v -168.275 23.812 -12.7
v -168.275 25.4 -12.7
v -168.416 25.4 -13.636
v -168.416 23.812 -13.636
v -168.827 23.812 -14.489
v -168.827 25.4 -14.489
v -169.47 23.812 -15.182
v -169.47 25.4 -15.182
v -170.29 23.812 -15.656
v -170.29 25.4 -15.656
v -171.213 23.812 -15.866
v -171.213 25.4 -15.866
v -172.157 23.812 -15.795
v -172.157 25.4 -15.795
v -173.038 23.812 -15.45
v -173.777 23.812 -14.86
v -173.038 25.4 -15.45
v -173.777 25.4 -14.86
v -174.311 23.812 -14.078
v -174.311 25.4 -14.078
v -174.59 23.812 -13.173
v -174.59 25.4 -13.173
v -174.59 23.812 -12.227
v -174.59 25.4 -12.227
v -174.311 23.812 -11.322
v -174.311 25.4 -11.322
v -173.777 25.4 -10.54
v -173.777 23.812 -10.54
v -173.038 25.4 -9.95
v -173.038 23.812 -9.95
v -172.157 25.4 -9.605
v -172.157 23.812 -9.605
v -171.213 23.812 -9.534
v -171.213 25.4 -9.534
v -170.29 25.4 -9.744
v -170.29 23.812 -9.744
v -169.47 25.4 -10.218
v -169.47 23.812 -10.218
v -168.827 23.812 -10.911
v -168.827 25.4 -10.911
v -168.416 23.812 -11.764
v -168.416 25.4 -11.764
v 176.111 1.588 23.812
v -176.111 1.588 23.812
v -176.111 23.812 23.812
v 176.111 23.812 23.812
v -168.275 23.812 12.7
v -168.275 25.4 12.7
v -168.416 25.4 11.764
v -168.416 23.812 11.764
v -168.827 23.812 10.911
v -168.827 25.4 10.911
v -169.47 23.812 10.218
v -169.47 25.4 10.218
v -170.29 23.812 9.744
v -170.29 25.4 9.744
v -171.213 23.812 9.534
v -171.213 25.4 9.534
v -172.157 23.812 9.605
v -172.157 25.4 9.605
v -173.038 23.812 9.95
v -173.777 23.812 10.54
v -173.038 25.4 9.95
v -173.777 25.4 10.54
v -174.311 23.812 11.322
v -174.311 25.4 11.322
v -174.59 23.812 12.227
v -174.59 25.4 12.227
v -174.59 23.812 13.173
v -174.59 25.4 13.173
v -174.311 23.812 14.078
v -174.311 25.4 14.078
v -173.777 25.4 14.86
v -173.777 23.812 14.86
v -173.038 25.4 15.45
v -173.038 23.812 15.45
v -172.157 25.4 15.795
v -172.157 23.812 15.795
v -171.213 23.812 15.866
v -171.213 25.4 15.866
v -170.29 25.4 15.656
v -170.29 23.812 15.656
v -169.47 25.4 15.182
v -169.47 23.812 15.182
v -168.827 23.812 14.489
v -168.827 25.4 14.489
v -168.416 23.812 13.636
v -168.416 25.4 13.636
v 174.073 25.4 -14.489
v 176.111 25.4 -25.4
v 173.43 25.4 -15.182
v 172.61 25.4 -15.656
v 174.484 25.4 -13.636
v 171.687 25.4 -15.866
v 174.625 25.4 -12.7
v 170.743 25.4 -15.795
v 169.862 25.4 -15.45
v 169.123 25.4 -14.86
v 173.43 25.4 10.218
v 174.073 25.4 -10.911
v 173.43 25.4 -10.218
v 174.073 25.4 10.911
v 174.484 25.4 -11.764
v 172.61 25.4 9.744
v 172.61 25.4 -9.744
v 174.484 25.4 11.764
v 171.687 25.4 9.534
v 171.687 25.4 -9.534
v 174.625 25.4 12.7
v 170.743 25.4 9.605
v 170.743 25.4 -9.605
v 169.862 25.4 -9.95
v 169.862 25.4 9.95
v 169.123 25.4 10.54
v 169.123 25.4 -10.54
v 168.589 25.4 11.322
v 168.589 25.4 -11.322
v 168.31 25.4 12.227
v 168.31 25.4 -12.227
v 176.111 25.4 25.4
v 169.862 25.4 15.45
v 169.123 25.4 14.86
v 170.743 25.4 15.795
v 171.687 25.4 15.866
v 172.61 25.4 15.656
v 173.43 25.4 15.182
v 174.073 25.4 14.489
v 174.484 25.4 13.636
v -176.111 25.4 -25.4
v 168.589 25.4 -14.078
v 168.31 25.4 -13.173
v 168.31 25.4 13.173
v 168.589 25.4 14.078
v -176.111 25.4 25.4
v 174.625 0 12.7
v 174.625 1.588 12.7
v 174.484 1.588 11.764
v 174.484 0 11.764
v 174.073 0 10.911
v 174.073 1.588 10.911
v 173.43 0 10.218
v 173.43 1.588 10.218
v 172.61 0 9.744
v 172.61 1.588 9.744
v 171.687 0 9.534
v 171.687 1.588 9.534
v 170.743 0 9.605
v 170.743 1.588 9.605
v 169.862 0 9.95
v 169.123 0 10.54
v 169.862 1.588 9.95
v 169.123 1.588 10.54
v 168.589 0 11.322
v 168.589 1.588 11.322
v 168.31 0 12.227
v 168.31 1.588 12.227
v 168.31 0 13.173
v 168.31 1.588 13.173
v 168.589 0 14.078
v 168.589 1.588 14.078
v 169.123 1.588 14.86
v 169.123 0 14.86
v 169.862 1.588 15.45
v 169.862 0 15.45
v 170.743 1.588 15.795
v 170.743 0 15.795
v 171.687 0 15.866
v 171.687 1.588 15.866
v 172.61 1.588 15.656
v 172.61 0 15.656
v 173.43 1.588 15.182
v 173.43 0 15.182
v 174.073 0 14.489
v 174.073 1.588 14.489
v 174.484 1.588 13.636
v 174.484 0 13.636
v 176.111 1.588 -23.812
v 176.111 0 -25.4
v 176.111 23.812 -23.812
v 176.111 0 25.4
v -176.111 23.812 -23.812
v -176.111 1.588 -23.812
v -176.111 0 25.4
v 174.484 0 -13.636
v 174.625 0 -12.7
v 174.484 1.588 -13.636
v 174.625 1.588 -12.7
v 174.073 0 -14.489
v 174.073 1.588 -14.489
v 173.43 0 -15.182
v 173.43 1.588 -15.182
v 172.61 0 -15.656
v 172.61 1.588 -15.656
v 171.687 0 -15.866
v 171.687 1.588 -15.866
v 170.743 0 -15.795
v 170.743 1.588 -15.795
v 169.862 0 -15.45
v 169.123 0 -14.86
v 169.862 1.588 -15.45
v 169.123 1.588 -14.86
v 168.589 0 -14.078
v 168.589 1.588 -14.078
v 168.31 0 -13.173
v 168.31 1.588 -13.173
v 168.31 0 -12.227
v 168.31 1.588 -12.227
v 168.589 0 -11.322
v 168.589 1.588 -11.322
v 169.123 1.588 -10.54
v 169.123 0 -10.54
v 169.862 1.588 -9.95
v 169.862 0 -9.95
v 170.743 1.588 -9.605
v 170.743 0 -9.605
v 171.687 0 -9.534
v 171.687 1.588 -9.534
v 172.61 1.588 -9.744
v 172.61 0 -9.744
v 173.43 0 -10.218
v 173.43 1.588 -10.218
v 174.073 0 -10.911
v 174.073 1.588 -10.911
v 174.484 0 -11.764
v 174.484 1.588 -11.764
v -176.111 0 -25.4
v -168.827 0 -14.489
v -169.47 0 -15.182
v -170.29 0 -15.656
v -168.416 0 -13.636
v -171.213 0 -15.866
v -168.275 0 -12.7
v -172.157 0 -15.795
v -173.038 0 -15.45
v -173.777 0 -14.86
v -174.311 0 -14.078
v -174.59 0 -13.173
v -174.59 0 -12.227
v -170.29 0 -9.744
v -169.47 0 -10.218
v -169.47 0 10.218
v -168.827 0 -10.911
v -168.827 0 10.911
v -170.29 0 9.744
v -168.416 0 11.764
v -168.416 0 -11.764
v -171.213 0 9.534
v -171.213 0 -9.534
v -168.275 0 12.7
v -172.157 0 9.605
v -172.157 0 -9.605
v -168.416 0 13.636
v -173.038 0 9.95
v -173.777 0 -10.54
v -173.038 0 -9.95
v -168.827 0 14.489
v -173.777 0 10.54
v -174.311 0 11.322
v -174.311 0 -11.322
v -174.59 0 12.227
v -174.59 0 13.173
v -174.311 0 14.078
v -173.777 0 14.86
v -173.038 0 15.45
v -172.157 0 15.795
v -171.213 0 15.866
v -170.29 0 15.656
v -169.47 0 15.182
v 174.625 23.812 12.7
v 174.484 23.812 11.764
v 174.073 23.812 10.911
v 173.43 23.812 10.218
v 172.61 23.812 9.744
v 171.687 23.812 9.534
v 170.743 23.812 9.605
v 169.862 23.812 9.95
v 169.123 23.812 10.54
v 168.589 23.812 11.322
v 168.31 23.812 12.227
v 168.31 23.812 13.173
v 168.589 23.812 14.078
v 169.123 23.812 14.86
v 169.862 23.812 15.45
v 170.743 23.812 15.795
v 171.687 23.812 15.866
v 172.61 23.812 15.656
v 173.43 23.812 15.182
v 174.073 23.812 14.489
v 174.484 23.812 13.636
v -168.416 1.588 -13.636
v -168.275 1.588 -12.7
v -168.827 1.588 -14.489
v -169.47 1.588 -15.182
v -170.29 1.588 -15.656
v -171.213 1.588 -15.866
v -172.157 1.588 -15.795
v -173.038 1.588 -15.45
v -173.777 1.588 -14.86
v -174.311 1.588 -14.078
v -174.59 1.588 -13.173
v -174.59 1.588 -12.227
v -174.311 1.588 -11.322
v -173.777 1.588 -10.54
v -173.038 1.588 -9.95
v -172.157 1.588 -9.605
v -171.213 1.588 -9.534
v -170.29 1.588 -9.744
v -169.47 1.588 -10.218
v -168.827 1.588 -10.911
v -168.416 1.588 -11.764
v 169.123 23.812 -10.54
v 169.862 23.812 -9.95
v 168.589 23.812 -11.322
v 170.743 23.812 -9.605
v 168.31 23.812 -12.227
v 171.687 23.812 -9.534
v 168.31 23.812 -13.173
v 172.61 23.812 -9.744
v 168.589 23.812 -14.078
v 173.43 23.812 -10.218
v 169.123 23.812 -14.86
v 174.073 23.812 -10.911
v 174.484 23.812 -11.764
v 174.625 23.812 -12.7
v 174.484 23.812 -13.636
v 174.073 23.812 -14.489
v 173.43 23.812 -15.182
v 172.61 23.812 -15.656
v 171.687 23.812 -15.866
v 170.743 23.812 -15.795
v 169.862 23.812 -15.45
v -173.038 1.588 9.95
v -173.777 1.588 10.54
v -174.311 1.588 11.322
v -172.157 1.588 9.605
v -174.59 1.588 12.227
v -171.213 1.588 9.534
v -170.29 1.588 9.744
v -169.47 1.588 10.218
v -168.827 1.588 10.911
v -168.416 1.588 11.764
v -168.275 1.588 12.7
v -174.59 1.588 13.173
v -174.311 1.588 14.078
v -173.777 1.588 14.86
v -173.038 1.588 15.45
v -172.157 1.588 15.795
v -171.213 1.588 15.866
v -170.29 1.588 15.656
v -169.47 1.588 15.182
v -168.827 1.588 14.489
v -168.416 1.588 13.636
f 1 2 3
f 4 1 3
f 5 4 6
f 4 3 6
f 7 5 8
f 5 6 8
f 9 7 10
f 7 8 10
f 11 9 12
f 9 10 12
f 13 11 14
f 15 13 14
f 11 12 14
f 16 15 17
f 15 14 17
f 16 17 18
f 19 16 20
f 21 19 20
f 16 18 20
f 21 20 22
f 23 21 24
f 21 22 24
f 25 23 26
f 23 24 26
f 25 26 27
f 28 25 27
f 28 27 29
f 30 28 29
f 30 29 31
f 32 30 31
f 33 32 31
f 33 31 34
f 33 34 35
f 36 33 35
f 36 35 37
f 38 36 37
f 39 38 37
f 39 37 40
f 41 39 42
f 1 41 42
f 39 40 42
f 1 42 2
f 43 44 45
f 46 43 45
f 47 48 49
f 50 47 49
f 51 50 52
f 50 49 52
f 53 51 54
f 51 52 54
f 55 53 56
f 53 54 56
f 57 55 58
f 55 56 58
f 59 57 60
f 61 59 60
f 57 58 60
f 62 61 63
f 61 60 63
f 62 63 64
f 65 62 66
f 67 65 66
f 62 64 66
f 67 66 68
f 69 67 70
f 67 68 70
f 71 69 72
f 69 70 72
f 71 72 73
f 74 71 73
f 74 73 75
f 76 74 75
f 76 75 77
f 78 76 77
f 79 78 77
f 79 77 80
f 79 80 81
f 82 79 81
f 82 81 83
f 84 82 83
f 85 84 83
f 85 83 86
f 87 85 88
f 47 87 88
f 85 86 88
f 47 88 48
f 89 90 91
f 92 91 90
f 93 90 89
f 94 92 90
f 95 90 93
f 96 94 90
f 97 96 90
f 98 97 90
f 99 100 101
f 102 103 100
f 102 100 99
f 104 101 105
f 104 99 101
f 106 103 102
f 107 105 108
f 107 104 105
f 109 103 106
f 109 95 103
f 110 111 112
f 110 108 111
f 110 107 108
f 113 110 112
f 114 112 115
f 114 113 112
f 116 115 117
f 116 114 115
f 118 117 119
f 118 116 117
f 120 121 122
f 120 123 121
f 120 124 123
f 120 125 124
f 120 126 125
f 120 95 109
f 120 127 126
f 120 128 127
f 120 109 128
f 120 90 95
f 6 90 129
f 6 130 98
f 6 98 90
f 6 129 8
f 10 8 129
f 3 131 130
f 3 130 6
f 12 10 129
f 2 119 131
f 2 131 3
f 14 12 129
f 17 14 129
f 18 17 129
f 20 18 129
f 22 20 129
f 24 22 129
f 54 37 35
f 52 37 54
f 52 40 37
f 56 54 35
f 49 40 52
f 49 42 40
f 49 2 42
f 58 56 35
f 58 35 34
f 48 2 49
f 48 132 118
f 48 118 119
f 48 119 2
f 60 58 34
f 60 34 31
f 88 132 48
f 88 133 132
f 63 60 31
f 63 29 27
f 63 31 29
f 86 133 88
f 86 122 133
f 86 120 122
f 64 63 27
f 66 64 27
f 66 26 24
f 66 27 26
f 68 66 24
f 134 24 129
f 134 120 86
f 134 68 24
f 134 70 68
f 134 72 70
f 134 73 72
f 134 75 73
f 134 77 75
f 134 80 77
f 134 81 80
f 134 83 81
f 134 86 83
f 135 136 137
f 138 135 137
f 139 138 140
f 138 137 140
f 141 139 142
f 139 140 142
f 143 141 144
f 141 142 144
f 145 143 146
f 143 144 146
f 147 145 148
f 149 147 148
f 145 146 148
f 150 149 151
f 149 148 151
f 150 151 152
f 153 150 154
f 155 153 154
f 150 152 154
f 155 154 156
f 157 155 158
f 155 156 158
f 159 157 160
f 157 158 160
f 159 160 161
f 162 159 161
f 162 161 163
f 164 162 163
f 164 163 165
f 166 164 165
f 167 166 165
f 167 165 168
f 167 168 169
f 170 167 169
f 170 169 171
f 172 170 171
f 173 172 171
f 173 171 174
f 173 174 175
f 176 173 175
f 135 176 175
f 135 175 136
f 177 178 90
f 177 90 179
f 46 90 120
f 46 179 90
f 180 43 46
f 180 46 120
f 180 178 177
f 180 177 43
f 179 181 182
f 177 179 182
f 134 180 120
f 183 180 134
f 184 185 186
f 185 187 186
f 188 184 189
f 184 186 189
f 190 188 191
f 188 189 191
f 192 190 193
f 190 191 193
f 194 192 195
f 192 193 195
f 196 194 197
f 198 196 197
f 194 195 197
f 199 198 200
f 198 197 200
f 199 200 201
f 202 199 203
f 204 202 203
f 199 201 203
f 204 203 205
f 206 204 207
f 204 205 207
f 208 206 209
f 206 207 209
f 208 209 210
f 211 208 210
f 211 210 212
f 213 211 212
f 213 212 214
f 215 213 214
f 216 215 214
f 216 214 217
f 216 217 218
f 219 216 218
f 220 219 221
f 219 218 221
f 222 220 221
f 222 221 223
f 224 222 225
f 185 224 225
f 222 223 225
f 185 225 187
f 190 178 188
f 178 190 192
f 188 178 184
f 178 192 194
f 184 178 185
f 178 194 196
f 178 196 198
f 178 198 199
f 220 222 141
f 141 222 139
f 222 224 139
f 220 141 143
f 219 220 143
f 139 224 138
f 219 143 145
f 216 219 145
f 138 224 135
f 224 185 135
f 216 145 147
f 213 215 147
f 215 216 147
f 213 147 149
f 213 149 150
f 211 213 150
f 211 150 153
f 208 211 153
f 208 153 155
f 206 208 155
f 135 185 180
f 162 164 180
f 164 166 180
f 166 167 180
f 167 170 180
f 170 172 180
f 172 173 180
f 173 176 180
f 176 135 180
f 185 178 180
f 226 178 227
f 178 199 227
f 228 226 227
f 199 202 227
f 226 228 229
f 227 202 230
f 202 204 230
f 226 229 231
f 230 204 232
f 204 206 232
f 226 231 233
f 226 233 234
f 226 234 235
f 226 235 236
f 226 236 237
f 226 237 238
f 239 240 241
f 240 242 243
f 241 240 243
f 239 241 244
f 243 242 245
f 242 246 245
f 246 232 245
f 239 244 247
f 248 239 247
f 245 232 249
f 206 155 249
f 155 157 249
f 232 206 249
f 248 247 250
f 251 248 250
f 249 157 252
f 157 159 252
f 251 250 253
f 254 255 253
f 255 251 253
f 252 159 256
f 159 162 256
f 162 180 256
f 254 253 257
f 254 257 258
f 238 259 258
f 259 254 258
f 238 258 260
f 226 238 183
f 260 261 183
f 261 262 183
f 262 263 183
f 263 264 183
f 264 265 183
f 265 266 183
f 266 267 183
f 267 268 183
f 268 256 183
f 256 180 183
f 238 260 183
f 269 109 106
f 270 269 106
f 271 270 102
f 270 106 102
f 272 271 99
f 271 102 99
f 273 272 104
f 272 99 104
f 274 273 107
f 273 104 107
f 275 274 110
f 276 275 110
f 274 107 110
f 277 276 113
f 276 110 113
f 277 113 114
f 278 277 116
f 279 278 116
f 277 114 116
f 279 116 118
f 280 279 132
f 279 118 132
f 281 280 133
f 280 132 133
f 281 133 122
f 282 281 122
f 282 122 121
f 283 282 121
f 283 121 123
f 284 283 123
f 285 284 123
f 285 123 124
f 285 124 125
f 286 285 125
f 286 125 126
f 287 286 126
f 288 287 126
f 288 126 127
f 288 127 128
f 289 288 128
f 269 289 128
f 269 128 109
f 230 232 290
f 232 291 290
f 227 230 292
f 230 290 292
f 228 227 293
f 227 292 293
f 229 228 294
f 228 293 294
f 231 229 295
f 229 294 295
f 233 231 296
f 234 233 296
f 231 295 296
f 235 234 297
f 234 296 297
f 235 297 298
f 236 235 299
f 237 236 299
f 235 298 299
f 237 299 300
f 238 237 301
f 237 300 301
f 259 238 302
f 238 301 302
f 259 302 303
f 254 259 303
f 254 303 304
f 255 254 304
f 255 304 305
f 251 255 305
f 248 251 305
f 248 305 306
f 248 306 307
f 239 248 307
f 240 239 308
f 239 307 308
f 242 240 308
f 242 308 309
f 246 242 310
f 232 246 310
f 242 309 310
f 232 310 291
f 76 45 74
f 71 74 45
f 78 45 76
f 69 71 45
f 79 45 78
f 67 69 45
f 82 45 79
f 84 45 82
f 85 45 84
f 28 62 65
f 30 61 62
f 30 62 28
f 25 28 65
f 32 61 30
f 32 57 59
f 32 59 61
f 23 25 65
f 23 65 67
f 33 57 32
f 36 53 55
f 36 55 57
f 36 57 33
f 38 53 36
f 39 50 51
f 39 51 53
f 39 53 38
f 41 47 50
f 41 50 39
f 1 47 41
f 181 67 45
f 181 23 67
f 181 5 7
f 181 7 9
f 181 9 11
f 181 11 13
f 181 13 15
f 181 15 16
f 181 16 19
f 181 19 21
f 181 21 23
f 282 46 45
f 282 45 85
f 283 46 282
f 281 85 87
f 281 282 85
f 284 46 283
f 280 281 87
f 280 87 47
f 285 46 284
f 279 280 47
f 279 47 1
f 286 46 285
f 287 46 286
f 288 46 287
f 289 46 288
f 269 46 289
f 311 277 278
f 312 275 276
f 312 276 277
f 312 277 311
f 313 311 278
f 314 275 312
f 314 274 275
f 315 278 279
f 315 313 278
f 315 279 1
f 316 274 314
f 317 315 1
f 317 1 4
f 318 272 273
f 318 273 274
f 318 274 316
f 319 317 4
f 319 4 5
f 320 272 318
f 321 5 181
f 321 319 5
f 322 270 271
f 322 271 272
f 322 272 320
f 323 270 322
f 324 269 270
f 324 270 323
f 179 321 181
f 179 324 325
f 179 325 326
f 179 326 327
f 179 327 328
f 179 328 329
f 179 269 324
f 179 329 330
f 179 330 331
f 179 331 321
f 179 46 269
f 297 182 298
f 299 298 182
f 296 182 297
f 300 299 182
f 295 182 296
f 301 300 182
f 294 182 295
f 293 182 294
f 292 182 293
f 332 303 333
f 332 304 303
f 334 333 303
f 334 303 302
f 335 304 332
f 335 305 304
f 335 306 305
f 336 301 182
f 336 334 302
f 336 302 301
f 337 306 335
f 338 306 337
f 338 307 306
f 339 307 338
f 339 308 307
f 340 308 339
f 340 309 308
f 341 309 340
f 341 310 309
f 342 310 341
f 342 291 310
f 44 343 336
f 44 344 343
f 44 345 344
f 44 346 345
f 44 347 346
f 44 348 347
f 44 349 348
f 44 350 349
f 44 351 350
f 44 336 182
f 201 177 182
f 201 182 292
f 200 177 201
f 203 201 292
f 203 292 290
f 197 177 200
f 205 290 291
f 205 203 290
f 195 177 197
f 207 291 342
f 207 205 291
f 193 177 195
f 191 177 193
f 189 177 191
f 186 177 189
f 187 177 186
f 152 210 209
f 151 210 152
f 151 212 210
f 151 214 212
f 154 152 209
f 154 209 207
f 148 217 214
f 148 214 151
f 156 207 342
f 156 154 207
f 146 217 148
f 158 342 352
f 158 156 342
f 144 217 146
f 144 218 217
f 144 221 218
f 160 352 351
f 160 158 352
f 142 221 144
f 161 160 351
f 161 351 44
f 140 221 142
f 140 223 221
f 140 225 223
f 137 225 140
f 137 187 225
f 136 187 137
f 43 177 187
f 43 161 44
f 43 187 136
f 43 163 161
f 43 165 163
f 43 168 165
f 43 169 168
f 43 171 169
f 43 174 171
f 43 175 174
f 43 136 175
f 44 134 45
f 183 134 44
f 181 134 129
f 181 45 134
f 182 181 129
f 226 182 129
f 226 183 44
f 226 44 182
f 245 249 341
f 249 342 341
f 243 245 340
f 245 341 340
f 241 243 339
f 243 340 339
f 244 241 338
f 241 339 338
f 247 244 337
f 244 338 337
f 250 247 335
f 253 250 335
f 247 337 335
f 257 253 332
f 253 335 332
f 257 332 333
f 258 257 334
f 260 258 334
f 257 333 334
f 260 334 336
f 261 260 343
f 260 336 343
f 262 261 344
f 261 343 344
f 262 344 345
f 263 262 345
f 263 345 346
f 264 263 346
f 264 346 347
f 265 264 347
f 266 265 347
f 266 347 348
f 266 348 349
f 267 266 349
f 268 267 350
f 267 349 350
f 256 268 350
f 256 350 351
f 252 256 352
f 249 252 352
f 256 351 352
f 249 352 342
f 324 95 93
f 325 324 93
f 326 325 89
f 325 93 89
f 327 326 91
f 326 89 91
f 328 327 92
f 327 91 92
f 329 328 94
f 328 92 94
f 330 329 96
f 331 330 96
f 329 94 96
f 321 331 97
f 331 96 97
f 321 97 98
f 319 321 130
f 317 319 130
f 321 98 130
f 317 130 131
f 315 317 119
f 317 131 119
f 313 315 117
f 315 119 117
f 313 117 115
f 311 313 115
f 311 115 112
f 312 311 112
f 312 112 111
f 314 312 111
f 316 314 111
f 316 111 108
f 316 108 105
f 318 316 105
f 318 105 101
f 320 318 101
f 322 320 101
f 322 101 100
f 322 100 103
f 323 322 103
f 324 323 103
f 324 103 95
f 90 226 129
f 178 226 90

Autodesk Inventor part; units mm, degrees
ref_plane "YZ Plane" through (0, 0, 0) normal (1, 0, 0) x (0, 1, 0)
ref_plane "XZ Plane" through (0, 0, 0) normal (0, 1, 0) x (-1, 0, 0)
ref_plane "XY Plane" through (0, 0, 0) normal (0, 0, 1) x (1, 0, 0)
sketch "Sketch1" plane through (0, 0, 0) normal (0, 1, 0) x (-1, 0, 0)
  line L0 (176.1109, -25.4) -> (-176.1109, -25.4)
  line L1 (-176.1109, -25.4) -> (-176.1109, 25.4)
  line L2 (-176.1109, 25.4) -> (176.1109, 25.4)
  line L3 (176.1109, 25.4) -> (176.1109, -25.4)
  line L4 (176.1109, -25.4) -> (-176.1109, 25.4) construction
  line L5 (-176.1109, -25.4) -> (176.1109, 25.4) construction
  point P0 (0, 0)
  dimension "d0" = 352.2218
  dimension "d1" = 50.8
extrude "Extrusion1" add sketch "Sketch1" along normal blind 25.4
sketch "Sketch2" plane through (176.1109, 0, 25.4) normal (1, 0, 0) x (0, 0, -1)
  line L0 (25.4, 0) -> (25.4, 12.7) construction
  line L1 (1.5875, 23.8125) -> (49.2125, 23.8125)
  line L2 (49.2125, 23.8125) -> (49.2125, 1.5875)
  line L3 (49.2125, 1.5875) -> (1.5875, 1.5875)
  line L4 (1.5875, 1.5875) -> (1.5875, 23.8125)
  line L5 (1.5875, 23.8125) -> (49.2125, 1.5875) construction
  line L6 (49.2125, 23.8125) -> (1.5875, 1.5875) construction
  dimension "d4" = 12.7
  dimension "d5" = 47.625
  dimension "d6" = 22.225
extrude "Extrusion2" cut sketch "Sketch2" against normal through all
sketch "Sketch3" plane through (0, 25.4, 0) normal (0, 1, 0) x (1, 0, 0)
  line L0 (-180.7718, 12.7) -> (-171.45, 12.7) construction
  line L1 (-171.45, 12.7) -> (-171.45, -12.7) construction
  line L2 (-171.45, -12.7) -> (-180.7718, -12.7) construction
  line L3 (-180.7718, -12.7) -> (-180.7718, 12.7) construction
  line L4 (-176.1109, 23.8125) -> (-176.1109, -23.8125) construction
  line L5 (-180.7718, 12.7) -> (-171.45, -12.7) construction
  line L6 (-171.45, 12.7) -> (-180.7718, -12.7) construction
  circle A0 centre (-171.45, 12.7) radius 3.175
  circle A1 centre (-171.45, -12.7) radius 3.175
  line L7 (0, 0) -> (0, -23.8125) construction
  circle A2 centre (171.45, 12.7) radius 3.175
  circle A3 centre (171.45, -12.7) radius 3.175
  point P0 (-176.1109, 0)
  dimension "d9" = 9.3218
  dimension "d10" = 25.4
  dimension "d11" = 6.35
  dimension "d12" = 6.35
extrude "Extrusion3" cut sketch "Sketch3" against normal through all
properties part number "Tube"
